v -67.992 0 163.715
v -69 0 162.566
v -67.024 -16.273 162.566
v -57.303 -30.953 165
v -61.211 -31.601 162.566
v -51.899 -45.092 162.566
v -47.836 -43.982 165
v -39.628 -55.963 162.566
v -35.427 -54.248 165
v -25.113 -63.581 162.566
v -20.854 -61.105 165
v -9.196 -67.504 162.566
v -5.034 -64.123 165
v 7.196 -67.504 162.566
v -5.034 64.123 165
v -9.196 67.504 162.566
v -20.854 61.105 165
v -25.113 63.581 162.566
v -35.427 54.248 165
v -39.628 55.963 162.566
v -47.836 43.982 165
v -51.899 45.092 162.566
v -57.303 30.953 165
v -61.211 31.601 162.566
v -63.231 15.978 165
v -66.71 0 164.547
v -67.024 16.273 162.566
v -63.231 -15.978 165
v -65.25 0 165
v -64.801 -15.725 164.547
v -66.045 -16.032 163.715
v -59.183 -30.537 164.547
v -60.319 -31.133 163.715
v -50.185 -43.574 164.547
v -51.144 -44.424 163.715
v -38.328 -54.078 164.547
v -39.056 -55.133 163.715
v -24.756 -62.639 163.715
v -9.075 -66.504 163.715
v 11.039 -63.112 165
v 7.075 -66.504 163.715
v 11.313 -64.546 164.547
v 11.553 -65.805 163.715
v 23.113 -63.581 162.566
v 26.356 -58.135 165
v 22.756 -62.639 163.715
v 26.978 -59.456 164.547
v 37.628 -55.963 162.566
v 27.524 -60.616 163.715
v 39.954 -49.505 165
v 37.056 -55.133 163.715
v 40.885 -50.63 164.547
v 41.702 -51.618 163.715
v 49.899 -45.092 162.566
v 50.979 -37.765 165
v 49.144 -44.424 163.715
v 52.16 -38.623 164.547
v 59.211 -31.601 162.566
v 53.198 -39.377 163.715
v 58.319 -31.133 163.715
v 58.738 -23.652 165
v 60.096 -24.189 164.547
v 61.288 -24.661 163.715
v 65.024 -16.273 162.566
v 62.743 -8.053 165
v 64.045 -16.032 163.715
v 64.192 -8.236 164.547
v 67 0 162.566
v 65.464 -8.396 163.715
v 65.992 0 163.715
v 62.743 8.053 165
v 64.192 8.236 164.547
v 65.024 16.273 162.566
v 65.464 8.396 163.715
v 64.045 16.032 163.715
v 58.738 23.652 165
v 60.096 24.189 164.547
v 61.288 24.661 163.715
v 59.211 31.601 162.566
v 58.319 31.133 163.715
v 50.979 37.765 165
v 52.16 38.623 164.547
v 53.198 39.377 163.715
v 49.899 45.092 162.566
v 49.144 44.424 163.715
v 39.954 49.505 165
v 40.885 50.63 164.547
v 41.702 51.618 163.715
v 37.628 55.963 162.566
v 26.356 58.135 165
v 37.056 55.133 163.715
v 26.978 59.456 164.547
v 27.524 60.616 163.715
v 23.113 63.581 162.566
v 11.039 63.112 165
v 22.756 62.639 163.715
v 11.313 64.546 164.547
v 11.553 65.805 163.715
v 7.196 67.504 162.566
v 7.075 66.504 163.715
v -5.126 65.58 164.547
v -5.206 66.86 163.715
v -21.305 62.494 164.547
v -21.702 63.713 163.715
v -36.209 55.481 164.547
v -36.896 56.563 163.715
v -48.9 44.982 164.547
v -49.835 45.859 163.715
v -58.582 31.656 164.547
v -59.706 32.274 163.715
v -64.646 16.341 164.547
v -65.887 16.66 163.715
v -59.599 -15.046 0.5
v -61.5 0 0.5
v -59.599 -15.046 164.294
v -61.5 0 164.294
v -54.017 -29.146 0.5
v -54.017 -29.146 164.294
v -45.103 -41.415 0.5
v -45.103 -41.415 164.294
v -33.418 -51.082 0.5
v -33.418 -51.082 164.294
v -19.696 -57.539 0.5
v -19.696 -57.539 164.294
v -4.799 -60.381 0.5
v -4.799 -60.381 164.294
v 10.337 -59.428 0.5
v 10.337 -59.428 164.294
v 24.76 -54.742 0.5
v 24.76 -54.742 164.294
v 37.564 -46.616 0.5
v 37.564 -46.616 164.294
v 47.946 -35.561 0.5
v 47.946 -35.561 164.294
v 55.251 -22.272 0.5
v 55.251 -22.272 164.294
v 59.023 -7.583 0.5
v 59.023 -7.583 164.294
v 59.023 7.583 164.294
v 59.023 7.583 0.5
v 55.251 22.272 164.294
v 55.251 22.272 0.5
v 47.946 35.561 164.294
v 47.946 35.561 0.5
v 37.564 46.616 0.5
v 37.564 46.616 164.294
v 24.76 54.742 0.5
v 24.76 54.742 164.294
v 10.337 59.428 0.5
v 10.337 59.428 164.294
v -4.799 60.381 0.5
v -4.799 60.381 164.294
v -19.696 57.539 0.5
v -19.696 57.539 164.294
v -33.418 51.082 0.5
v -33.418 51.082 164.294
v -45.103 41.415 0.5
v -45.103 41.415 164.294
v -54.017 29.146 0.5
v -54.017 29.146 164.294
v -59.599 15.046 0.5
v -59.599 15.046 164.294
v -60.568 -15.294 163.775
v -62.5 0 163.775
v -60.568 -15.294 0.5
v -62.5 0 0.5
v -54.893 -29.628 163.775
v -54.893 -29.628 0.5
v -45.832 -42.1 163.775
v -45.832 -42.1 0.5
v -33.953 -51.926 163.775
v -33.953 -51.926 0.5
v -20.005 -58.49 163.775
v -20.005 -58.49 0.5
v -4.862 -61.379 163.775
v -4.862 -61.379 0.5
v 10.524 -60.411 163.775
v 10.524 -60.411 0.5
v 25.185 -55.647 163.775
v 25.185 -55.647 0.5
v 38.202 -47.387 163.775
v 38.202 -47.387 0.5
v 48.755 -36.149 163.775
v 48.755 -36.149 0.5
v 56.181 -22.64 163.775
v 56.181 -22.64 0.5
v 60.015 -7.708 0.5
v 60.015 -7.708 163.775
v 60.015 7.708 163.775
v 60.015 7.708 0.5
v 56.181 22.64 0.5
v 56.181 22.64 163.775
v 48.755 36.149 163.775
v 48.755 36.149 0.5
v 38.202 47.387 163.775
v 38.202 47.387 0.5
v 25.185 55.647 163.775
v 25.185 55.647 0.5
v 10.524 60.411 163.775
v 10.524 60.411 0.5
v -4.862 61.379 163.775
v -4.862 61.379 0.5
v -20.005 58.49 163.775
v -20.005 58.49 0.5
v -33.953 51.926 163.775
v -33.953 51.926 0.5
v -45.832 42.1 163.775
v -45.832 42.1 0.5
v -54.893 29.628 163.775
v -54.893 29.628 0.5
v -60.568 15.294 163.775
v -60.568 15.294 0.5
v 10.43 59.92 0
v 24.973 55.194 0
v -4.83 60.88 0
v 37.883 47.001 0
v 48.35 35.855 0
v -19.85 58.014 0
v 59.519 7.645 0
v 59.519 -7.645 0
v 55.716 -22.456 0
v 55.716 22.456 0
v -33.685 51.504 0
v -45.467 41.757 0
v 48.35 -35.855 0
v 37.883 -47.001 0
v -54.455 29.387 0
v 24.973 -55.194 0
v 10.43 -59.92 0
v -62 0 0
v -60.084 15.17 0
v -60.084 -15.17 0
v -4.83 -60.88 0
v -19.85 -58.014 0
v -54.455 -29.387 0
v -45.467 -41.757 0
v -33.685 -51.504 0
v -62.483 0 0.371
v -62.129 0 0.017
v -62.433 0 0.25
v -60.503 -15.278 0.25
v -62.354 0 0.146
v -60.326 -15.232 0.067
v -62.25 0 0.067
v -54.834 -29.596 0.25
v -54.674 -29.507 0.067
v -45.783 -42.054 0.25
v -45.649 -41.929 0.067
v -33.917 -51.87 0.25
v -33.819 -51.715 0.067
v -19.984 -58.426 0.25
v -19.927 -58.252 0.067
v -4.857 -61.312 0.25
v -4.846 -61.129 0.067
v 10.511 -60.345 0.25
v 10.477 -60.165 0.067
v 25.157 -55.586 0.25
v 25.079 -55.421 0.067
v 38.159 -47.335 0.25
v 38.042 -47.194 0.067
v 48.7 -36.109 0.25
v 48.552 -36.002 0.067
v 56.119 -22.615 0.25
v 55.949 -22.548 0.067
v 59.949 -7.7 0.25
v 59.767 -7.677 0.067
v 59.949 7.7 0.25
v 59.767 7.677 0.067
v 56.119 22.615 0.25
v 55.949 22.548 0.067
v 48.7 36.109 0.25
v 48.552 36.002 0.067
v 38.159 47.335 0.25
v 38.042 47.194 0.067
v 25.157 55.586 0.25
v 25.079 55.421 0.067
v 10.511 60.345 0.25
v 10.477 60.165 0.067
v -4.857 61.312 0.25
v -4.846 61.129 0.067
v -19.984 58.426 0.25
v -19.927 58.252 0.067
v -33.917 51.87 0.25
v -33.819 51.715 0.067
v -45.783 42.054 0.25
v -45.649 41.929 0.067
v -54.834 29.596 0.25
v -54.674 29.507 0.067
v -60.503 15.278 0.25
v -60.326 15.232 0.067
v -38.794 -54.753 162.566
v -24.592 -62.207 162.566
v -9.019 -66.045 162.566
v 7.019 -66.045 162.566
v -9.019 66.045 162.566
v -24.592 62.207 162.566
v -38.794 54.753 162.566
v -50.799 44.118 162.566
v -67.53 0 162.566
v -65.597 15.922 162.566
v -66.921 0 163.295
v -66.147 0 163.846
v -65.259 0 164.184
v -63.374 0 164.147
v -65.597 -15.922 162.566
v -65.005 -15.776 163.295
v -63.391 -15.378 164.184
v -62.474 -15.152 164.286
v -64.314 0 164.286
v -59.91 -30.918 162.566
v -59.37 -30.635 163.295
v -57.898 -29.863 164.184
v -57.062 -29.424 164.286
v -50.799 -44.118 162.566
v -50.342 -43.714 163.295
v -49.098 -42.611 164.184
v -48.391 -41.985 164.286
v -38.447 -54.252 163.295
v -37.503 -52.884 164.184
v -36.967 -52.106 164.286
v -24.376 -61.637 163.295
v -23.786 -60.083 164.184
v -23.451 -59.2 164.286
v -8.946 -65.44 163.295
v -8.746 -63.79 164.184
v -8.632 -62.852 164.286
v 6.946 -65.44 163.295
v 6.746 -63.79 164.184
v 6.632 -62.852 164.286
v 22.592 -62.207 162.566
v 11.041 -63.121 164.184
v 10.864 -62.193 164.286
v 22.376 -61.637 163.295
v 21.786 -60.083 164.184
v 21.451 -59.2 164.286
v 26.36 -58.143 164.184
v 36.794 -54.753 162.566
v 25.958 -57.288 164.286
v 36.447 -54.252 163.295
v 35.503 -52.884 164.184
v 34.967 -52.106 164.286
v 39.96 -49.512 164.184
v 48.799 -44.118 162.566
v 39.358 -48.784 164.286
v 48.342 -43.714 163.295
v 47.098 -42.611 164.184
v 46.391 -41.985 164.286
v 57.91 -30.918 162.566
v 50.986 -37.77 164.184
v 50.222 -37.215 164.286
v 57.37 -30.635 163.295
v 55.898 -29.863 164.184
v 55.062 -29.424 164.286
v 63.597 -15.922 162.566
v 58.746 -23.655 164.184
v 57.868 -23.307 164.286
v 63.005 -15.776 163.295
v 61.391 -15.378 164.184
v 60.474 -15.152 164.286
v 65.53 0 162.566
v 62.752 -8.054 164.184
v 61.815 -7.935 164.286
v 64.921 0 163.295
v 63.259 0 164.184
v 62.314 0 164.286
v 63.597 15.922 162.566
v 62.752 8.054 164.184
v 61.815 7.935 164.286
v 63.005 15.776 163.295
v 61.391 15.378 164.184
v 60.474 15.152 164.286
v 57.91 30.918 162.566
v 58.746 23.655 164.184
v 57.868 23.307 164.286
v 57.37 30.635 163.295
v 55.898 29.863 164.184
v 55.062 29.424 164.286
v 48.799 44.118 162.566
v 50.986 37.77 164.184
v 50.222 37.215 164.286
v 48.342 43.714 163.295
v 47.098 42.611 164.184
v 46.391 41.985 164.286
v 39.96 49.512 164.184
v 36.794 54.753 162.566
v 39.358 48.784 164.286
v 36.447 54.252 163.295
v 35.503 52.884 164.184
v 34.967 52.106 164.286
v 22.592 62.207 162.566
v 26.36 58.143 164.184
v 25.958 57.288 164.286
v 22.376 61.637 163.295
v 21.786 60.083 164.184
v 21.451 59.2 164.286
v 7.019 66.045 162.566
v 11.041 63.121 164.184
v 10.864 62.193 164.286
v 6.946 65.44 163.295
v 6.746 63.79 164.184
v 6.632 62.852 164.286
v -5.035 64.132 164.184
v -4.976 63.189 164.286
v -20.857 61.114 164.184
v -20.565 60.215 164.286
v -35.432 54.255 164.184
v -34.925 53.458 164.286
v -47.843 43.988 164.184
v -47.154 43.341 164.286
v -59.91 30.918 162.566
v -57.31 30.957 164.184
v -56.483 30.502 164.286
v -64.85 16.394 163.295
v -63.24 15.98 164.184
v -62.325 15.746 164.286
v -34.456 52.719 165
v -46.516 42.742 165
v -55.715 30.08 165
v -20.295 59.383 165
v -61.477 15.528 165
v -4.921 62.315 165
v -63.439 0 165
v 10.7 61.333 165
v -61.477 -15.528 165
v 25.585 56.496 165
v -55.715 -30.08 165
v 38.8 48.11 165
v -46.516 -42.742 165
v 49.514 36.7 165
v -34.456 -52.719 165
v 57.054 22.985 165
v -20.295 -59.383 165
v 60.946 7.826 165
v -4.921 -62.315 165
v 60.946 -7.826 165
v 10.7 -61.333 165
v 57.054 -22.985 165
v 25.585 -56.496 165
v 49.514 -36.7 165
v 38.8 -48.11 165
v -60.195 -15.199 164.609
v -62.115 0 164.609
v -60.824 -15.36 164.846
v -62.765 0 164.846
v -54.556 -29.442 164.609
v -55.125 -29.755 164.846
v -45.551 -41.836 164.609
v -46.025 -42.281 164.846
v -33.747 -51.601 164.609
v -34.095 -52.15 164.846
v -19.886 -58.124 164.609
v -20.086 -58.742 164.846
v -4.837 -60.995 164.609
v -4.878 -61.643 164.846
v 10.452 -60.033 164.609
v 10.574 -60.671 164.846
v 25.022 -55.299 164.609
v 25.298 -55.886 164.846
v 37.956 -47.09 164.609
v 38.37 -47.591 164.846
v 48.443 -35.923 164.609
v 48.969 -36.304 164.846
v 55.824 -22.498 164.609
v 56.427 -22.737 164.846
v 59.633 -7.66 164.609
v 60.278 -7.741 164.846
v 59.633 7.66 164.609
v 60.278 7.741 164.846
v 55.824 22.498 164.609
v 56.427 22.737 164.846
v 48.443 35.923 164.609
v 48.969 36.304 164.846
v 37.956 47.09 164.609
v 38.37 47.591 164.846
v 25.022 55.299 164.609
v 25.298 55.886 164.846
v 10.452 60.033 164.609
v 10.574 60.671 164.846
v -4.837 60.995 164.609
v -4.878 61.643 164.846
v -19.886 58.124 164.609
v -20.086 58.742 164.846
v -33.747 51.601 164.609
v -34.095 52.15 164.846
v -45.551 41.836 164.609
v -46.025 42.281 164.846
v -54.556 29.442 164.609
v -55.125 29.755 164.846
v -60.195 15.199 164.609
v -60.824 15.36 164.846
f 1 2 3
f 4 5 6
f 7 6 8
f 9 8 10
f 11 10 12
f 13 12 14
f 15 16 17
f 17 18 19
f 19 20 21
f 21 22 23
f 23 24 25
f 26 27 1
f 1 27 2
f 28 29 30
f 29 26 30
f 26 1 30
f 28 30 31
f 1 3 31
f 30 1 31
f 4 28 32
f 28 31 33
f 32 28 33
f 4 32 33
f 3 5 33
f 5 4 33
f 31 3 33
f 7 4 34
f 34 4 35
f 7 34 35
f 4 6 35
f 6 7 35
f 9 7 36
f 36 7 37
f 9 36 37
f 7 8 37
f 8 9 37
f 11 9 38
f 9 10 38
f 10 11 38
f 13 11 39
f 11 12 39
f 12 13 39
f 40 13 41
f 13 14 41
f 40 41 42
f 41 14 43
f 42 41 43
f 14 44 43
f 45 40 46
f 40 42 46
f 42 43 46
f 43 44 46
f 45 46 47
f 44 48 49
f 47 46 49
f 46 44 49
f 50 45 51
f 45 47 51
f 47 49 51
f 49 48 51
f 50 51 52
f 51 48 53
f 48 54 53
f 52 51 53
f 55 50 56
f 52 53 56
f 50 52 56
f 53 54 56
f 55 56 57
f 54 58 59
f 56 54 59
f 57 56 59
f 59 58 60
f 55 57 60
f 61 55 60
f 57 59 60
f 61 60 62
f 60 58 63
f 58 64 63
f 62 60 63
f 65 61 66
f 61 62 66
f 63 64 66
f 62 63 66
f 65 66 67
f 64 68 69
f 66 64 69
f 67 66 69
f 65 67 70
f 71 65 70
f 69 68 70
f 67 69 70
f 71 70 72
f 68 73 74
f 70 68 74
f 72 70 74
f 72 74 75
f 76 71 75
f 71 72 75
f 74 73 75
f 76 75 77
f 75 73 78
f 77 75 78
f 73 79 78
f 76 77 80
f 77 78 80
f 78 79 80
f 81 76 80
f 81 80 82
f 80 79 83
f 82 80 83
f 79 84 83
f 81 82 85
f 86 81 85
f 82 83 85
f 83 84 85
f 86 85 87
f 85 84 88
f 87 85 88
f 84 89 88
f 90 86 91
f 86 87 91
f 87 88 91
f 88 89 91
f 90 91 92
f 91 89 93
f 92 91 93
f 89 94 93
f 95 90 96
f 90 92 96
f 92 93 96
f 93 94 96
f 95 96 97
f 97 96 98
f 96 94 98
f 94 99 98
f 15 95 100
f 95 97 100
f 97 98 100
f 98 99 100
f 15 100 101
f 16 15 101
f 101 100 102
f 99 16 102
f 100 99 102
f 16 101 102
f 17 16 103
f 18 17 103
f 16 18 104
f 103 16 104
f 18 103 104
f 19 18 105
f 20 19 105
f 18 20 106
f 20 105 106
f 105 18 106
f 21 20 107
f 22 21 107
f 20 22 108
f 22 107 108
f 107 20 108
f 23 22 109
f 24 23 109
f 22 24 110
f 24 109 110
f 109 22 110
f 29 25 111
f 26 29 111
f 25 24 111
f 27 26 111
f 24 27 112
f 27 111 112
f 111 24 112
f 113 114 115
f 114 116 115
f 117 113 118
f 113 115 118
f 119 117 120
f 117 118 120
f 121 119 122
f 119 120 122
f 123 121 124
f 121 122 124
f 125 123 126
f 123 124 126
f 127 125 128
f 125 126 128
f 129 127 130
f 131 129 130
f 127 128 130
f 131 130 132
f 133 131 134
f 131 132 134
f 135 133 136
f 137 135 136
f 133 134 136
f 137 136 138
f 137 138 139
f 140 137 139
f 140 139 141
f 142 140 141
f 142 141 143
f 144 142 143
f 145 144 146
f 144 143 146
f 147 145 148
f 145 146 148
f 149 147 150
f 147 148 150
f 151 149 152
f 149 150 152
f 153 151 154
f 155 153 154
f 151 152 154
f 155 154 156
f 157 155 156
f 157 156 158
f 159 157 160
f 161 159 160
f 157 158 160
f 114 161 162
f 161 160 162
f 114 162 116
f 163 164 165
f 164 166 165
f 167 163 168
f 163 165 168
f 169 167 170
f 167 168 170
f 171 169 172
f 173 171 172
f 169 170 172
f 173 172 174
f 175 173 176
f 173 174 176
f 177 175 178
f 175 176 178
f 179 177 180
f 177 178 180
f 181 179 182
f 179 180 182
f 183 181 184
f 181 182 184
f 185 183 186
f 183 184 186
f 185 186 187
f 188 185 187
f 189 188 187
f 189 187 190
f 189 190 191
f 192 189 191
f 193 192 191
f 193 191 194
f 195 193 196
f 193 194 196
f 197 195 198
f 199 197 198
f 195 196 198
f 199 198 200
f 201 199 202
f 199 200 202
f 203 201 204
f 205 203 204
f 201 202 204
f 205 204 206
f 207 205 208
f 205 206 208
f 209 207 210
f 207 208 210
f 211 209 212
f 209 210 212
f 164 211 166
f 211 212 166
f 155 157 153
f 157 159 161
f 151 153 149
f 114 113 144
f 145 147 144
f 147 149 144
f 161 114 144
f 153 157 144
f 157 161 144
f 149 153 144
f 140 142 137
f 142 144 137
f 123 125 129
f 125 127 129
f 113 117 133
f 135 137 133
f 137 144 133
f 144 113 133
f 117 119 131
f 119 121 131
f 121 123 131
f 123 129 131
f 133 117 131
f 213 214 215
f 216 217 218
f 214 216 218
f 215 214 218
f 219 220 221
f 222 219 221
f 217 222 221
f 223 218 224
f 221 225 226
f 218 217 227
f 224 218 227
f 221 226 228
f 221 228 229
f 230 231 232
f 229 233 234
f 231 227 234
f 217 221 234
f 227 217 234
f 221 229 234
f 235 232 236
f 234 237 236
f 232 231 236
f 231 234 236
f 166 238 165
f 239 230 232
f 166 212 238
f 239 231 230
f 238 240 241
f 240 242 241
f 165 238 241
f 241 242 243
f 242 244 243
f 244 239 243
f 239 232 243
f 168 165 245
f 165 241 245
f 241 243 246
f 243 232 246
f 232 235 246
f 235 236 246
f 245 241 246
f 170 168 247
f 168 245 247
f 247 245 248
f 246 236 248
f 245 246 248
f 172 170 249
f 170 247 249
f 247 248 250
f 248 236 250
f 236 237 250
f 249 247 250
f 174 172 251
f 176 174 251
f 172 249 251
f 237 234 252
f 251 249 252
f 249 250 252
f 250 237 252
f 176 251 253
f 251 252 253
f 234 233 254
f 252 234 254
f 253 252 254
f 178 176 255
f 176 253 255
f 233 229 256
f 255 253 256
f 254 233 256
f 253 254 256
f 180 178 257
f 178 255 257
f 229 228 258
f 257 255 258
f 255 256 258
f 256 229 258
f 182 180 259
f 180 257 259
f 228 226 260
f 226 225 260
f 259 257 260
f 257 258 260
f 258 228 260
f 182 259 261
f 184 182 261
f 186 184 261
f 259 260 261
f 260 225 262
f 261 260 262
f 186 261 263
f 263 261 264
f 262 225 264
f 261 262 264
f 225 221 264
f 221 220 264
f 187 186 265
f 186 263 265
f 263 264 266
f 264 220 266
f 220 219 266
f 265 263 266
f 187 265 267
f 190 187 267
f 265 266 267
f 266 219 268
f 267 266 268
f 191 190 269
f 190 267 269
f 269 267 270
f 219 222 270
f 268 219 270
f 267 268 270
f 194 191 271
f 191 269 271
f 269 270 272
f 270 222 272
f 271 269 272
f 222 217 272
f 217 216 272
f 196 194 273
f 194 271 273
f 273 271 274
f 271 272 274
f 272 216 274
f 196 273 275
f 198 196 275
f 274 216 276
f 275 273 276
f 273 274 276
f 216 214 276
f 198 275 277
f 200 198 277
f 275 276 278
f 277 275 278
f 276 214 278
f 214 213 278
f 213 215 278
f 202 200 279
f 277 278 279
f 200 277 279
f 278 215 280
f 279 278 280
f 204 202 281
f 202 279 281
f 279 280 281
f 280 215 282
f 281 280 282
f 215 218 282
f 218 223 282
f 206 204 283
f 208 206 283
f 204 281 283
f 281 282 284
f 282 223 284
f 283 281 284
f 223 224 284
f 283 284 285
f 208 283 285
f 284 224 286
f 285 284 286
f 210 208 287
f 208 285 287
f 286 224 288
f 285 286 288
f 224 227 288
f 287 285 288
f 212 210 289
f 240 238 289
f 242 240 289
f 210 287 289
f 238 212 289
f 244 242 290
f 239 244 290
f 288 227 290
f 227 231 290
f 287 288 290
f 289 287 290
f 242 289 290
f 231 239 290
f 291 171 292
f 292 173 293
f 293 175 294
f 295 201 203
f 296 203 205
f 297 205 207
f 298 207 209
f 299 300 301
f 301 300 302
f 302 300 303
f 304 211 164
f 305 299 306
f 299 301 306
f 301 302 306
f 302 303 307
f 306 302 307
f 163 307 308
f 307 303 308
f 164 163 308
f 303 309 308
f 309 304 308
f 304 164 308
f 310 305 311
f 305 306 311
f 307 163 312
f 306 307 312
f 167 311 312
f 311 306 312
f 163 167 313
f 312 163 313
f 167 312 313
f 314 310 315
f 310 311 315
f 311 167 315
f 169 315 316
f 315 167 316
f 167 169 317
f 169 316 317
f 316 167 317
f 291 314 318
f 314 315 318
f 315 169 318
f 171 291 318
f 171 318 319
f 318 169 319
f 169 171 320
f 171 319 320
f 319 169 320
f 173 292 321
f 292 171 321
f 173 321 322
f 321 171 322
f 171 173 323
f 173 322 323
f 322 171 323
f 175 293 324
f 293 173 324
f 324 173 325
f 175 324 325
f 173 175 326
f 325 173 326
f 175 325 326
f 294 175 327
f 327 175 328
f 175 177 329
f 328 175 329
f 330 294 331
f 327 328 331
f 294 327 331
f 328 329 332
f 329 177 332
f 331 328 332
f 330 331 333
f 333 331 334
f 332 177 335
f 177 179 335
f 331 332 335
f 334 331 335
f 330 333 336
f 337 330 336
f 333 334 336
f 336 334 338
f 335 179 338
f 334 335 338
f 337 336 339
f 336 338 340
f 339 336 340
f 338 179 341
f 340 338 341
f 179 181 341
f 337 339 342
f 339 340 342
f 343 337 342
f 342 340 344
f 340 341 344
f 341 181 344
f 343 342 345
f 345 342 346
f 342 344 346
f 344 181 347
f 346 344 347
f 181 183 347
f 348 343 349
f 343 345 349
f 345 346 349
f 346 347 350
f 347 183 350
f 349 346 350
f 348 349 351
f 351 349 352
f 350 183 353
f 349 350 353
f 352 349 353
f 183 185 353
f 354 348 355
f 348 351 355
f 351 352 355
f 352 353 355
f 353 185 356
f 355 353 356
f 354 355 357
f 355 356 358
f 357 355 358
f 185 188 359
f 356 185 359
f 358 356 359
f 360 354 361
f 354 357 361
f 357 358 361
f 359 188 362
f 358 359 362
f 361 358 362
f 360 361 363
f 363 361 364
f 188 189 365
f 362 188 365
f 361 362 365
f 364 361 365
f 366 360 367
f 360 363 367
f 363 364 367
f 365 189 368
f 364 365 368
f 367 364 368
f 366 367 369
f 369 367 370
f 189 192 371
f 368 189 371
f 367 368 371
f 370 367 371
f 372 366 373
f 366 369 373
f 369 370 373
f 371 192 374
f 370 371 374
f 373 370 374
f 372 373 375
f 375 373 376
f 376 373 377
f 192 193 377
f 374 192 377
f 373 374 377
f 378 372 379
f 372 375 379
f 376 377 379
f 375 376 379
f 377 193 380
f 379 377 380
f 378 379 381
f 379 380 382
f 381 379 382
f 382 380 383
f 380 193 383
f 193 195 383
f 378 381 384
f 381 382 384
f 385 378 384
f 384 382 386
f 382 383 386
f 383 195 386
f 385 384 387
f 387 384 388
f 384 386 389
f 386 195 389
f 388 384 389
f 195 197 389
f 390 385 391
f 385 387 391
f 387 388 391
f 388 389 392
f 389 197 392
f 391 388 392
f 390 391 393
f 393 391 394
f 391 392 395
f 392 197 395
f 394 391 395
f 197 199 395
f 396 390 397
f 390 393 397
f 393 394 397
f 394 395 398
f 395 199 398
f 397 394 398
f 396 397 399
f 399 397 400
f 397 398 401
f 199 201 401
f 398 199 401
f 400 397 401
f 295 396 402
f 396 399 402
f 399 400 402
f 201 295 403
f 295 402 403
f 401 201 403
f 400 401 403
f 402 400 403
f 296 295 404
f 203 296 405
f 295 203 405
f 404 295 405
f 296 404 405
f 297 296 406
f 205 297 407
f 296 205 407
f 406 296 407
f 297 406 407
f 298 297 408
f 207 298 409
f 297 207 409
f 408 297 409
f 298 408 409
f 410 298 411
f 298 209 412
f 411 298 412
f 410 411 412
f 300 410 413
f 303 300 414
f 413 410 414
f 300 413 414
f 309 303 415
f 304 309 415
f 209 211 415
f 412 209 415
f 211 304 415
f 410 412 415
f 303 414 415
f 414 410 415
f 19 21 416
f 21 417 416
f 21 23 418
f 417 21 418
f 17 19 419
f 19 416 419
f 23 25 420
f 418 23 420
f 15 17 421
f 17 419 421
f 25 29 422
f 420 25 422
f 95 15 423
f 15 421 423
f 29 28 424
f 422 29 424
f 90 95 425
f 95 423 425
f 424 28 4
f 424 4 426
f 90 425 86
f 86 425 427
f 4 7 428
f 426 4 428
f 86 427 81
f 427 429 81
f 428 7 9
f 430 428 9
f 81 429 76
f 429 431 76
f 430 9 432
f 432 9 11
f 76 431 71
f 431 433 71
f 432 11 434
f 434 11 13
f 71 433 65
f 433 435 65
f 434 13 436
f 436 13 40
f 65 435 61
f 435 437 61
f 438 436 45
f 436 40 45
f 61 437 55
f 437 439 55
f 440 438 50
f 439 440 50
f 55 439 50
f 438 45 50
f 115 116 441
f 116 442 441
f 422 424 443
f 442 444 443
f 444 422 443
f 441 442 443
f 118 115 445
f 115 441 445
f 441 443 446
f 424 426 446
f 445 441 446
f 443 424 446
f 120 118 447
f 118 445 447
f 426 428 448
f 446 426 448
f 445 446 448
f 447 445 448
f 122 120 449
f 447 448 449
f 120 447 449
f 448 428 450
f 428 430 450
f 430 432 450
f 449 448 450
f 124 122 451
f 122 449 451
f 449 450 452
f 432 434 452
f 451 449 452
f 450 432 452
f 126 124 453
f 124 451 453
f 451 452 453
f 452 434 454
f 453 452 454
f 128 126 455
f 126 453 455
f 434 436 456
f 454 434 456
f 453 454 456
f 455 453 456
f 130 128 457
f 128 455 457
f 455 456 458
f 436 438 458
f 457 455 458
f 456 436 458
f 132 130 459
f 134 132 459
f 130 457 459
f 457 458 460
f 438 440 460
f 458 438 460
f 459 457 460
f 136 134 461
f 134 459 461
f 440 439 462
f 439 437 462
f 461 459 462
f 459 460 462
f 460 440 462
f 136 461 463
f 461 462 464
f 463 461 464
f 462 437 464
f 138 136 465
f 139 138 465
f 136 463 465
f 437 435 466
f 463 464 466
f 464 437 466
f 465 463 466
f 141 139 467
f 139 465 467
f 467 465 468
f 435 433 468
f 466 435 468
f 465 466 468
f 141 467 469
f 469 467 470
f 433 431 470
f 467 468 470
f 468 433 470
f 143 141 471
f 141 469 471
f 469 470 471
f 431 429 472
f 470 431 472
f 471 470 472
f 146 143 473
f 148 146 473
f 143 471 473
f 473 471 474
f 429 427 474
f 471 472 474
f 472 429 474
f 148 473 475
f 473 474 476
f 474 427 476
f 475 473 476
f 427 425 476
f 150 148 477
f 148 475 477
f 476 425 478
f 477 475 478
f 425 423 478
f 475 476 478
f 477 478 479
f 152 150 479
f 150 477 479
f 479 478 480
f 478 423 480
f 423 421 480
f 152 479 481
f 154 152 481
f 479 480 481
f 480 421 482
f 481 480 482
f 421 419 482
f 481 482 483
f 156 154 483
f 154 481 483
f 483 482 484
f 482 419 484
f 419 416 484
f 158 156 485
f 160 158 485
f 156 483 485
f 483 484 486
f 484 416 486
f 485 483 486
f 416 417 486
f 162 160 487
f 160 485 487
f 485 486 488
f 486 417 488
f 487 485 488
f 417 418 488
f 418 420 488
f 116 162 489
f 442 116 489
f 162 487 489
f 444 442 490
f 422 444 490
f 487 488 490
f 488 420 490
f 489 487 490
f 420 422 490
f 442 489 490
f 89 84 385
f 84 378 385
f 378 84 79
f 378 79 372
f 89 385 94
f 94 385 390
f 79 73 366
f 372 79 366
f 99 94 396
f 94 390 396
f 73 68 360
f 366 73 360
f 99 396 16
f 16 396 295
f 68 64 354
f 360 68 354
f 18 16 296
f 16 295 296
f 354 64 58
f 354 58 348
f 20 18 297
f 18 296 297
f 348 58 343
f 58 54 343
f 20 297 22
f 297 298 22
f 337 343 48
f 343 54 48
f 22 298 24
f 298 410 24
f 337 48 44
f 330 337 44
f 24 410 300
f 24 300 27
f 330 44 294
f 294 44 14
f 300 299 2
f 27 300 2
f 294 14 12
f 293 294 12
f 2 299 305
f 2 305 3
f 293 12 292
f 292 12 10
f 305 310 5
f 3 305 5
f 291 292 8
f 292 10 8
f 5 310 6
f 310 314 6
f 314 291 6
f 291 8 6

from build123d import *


with BuildPart() as f1:
    # F0 (on Front) → F1 (revolve)
    with BuildSketch(Plane.XZ):
        with BuildLine():
            Line((-61.5, 0), (-1, 0))
            Line((-1, 0), (-1, 0.5))
            Line((-1, 0.5), (-61.5, 0.5))
            Line((-61.5, 0.5), (-61.5, 164.293947))
            ThreePointArc((-61.5, 164.293947), (-62.436346, 164.737428), (-63.438581, 165))
            Line((-63.438581, 165), (-65.25, 165))
            ThreePointArc((-65.25, 165), (-67.379659, 164.175331), (-69, 162.565976))
            Line((-69, 162.565976), (-67.530356, 162.565976))
            ThreePointArc((-67.530356, 162.565976), (-65.25873, 164.183882), (-62.5, 163.774847))
            Line((-62.5, 163.774847), (-62.5, 162.919664))
            Line((-62.5, 162.919664), (-62.5, 0.5))
            ThreePointArc((-62.5, 0.5), (-62.353553, 0.146447), (-62, 0))
            Line((-62, 0), (-61.5, 0))
        make_face()
    revolve(axis=Axis((-1, 0, 17.714524), (0, 0, 1)))


solid = f1.part
